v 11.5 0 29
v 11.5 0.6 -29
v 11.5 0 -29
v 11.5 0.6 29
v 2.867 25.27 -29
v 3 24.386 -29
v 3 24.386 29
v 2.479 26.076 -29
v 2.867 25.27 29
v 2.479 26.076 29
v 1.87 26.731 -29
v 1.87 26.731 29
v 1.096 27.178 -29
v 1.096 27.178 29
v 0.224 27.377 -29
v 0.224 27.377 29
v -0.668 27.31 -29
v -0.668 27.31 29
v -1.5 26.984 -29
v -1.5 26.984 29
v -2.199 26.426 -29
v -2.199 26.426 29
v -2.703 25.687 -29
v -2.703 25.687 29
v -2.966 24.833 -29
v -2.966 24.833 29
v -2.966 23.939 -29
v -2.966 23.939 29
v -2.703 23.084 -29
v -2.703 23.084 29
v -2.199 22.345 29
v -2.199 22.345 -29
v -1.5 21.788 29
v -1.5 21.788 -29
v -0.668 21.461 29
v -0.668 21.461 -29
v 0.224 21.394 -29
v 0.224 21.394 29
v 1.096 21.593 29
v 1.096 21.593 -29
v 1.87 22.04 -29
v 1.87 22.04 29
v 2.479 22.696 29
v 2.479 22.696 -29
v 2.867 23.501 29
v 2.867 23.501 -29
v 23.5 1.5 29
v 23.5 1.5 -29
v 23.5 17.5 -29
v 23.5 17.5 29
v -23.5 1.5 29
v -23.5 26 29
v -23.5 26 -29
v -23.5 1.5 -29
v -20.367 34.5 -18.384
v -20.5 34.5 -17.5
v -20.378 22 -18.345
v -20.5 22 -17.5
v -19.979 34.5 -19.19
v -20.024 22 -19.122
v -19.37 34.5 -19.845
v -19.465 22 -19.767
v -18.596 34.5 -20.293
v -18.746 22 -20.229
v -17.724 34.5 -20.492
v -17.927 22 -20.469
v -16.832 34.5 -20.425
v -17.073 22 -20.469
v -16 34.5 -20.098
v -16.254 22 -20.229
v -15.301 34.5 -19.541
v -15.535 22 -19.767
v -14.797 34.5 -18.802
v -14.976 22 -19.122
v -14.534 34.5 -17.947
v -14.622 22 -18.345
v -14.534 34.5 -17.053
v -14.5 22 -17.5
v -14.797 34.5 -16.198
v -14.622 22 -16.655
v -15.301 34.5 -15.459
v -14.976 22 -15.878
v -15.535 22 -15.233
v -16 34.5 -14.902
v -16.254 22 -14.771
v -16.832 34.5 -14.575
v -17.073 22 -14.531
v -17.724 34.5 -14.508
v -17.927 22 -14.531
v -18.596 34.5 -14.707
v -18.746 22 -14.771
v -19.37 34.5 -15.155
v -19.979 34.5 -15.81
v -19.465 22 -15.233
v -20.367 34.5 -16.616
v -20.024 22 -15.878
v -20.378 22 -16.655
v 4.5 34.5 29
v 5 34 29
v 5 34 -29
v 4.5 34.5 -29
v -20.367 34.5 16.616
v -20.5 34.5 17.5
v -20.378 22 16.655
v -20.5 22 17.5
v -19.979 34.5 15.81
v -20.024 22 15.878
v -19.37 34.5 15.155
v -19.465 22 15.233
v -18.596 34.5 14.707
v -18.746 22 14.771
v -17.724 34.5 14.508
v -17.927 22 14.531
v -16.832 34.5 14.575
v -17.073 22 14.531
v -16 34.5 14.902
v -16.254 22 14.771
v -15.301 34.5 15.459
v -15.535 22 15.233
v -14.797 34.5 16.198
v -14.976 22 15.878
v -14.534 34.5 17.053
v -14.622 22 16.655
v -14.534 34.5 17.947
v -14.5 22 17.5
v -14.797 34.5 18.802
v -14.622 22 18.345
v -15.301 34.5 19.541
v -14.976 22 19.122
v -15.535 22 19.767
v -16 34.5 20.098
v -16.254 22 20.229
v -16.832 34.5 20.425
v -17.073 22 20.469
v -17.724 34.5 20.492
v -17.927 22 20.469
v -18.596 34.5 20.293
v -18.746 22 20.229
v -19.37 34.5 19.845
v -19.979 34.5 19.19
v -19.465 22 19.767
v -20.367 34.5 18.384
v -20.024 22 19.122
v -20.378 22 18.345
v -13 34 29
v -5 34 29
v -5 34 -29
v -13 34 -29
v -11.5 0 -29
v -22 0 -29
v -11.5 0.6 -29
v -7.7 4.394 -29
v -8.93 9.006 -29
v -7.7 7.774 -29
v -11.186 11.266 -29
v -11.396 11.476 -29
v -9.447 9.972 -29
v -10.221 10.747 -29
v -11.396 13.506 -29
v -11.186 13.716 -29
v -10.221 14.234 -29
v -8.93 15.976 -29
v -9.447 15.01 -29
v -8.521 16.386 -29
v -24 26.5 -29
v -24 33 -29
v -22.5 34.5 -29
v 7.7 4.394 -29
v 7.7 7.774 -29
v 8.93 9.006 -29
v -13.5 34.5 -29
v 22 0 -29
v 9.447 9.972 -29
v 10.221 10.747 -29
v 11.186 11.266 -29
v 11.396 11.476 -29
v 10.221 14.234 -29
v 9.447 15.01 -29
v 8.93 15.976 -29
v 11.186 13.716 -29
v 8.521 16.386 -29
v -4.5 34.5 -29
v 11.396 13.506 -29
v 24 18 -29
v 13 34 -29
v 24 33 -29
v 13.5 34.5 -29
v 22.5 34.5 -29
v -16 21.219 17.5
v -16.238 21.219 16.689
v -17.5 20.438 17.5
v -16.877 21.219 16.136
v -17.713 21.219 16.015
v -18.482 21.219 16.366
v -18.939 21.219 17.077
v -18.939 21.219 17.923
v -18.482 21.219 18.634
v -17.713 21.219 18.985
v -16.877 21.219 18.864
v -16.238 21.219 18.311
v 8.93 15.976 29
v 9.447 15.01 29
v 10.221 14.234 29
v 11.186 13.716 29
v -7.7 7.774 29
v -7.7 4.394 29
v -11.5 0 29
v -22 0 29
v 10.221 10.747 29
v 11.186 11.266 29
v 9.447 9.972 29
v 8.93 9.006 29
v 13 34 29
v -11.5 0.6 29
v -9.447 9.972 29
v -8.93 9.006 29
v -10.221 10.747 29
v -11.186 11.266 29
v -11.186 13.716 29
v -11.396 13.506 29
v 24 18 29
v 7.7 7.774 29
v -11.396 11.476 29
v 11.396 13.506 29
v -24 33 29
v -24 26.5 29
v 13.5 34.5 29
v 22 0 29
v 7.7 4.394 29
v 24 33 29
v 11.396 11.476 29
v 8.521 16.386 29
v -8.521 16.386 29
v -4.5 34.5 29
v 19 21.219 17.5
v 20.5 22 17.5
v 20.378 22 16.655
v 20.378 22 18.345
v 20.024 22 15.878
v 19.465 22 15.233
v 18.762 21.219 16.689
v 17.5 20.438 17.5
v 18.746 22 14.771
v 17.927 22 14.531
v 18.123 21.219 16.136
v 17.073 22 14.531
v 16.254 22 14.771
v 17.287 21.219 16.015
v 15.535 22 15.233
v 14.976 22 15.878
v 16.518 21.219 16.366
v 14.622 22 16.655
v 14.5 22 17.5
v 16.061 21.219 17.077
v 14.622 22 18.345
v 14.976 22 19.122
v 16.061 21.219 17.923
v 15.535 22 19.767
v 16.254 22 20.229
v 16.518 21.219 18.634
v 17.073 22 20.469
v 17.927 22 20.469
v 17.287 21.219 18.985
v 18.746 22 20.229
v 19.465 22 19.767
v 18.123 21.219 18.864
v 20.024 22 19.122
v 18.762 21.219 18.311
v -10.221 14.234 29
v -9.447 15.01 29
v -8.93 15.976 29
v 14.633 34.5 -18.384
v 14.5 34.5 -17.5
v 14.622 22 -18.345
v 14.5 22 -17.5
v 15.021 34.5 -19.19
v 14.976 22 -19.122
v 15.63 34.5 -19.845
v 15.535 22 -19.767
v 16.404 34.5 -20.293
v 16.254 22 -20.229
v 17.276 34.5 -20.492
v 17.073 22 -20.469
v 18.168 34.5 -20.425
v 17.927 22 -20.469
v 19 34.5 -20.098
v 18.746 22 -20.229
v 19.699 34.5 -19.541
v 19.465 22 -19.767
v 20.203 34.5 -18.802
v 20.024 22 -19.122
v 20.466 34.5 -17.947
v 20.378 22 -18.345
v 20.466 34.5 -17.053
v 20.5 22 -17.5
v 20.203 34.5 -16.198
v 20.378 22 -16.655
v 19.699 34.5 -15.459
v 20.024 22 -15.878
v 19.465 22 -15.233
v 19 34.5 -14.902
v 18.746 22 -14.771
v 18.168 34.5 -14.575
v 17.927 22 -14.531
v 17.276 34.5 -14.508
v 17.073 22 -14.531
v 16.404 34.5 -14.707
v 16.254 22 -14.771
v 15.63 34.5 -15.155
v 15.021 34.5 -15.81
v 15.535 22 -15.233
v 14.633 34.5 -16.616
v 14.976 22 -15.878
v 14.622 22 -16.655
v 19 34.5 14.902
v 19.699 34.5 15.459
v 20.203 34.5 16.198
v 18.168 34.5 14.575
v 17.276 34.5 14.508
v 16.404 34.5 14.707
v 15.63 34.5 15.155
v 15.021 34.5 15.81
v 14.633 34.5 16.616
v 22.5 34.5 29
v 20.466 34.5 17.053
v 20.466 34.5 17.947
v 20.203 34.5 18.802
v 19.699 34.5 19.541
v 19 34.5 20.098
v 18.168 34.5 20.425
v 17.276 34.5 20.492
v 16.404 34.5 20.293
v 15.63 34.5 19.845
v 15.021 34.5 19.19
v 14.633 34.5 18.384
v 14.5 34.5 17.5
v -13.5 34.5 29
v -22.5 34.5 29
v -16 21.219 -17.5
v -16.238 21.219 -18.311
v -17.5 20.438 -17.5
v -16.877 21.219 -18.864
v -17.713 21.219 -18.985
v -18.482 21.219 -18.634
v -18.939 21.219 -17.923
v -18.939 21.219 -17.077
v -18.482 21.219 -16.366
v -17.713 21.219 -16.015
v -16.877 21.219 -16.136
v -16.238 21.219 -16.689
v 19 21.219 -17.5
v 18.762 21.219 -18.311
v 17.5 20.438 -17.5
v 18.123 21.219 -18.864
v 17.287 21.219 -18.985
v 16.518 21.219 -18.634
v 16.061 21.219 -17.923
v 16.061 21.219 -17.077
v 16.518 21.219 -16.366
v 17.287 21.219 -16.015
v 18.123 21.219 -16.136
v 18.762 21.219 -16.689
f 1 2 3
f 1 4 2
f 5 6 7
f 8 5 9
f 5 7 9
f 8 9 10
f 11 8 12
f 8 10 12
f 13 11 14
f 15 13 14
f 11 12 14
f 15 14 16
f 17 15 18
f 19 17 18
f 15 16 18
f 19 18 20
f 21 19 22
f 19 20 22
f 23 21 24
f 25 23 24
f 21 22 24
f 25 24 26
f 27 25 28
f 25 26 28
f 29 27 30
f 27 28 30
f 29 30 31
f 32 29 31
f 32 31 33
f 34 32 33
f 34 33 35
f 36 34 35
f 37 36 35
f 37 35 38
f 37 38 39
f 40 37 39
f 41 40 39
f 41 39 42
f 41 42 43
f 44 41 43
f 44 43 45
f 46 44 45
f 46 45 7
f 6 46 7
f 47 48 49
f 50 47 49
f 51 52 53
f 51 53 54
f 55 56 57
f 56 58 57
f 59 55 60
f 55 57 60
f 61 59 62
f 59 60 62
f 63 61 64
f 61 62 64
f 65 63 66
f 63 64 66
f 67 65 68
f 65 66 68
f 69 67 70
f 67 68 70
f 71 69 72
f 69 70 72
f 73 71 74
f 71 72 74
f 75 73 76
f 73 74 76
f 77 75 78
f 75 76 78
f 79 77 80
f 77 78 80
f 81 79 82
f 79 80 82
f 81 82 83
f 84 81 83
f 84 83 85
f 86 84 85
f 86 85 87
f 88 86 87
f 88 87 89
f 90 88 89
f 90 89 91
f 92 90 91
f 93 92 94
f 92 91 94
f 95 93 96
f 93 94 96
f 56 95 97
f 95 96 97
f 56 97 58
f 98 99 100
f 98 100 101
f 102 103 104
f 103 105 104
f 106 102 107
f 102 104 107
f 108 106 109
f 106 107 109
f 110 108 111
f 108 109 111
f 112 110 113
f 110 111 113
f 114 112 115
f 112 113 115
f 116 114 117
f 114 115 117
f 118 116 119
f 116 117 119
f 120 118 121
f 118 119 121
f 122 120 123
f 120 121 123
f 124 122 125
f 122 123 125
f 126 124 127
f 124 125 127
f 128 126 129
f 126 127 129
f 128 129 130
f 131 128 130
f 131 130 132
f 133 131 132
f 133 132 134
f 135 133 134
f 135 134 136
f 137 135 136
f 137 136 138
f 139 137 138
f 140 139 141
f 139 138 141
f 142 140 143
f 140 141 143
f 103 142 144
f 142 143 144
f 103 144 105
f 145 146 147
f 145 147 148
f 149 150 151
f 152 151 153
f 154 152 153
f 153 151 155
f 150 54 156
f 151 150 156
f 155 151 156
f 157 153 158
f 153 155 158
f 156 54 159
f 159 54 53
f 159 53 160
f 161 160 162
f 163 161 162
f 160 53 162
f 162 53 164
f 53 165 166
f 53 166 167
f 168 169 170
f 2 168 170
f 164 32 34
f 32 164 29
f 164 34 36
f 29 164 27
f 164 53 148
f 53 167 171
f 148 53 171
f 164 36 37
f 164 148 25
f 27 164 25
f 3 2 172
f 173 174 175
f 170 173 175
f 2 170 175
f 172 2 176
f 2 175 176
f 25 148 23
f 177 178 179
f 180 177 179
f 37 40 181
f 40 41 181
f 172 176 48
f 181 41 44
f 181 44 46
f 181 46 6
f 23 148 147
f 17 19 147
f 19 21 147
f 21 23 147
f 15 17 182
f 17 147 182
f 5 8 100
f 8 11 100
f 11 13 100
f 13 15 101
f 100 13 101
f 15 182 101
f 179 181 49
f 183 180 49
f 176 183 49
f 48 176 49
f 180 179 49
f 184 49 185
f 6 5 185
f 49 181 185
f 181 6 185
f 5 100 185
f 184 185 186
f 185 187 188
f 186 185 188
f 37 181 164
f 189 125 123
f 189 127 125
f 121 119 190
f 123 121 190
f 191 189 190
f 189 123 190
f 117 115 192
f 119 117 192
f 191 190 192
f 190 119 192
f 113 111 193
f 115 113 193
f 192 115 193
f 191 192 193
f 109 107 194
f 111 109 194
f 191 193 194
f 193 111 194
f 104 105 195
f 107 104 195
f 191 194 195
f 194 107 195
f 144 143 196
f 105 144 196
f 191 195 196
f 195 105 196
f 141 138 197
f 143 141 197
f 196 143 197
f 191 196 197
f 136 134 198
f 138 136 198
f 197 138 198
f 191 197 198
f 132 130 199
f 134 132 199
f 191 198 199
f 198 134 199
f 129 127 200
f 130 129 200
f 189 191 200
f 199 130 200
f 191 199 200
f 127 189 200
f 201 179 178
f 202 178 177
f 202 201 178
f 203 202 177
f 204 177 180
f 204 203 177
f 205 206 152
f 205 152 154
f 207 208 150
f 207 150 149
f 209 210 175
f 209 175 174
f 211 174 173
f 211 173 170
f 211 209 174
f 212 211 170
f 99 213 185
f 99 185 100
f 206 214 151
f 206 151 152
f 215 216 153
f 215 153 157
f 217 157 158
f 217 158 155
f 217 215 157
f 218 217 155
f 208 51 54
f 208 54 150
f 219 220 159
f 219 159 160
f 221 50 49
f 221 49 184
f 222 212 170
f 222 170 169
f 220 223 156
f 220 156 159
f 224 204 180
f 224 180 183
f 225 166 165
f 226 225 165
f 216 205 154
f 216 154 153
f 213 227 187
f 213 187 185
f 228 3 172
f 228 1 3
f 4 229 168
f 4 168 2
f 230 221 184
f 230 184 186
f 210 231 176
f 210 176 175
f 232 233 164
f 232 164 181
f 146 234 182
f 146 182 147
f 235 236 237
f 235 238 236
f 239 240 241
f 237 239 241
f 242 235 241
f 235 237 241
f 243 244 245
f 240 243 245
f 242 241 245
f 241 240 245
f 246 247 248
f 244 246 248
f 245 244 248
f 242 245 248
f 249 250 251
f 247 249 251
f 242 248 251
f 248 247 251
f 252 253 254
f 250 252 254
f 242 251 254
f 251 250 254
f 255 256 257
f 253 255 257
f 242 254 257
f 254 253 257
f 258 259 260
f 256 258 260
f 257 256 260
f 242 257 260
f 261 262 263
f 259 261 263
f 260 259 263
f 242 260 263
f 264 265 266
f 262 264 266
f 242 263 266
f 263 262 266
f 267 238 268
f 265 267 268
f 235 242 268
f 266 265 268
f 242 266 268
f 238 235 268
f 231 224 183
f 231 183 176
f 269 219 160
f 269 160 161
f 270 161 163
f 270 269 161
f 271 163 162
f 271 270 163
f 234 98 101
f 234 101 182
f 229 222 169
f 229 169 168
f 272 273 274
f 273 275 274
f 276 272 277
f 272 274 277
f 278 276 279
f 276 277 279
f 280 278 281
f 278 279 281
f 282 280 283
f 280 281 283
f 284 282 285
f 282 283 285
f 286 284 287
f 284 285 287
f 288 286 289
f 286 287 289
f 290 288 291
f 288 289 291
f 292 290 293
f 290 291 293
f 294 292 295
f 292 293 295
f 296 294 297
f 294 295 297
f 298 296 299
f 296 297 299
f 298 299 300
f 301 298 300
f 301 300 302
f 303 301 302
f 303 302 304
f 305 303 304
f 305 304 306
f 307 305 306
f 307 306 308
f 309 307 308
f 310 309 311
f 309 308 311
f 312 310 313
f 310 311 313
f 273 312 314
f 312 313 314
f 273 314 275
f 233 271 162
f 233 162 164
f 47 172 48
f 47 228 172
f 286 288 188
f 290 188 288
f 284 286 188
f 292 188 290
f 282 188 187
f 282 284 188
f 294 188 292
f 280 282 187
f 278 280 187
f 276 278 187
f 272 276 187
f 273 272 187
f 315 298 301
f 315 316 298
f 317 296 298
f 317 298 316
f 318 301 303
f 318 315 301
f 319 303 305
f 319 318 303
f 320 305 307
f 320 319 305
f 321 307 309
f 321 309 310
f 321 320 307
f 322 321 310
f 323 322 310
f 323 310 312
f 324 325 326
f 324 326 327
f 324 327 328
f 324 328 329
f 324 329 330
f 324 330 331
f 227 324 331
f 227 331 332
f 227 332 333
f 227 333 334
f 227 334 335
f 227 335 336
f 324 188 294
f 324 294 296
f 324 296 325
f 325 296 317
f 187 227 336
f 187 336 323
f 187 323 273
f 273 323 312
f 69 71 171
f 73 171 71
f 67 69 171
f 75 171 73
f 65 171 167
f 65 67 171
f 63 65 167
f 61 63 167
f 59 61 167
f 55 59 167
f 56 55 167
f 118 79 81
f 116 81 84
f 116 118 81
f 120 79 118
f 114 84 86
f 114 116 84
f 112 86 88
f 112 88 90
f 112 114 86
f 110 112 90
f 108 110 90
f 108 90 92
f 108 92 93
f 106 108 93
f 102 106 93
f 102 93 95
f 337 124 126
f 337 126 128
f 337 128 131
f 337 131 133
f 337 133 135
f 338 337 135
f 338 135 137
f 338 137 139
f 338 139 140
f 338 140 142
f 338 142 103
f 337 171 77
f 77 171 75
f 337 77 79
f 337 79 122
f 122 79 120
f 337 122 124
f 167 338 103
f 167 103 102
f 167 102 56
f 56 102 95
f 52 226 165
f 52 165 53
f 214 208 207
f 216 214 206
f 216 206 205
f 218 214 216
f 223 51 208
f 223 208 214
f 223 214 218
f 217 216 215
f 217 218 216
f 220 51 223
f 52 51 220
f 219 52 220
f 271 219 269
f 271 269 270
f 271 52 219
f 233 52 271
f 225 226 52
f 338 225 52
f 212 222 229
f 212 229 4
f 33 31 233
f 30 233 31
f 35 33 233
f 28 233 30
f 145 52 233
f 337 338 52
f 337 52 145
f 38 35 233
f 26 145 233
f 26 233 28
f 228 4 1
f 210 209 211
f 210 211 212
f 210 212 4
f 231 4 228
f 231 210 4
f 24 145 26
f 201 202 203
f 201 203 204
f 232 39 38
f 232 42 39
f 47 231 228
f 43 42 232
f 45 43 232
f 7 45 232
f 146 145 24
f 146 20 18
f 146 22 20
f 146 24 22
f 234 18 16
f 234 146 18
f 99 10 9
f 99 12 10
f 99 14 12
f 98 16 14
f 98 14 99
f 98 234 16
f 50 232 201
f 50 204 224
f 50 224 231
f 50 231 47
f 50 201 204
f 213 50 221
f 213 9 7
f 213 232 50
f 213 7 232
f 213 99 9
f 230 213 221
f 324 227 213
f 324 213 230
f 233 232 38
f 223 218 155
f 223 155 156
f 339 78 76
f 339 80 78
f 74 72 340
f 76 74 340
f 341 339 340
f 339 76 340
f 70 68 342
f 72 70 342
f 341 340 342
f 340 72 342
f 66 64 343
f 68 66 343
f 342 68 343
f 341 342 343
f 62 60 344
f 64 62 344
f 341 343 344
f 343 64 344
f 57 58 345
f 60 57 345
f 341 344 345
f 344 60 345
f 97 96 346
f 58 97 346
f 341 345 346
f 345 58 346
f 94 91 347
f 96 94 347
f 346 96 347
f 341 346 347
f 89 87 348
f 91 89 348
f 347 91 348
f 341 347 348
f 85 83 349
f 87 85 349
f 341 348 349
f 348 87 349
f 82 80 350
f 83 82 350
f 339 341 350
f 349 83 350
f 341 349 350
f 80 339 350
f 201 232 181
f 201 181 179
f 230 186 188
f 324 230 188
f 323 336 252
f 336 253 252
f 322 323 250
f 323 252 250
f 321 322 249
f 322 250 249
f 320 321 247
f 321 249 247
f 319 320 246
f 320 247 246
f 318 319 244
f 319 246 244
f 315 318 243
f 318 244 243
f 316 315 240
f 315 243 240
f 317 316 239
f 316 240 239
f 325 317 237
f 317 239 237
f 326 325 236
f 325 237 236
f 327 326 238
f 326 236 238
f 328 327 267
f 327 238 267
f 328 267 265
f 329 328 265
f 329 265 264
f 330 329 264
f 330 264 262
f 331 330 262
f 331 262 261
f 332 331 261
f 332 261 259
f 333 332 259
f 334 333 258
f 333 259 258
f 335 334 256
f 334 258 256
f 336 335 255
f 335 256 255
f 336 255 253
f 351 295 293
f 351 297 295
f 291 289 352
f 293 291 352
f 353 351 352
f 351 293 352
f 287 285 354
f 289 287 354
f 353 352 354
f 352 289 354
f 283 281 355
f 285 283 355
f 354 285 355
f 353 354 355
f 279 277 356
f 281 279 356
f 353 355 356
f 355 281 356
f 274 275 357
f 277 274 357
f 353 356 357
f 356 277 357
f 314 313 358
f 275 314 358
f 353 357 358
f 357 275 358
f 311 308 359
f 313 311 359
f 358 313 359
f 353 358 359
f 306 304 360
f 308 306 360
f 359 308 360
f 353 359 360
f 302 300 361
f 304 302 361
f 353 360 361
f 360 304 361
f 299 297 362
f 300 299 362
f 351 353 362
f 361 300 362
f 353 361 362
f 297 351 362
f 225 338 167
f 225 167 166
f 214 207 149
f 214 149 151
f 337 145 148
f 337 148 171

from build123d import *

# Parameters (mm, degrees)
BLOCK_DEPTH                     = 29
TAP_DRILL_FOR_M8X1_0_TAP1_D     = 6
TAP_DRILL_FOR_M8X1_0_TAP1_DEPTH = 12.5
TAP_DRILL_FOR_M8X1_0_TAP1_TIP   = 1.561701152
F_6_0_6_DIAMETER_HOLE1_D        = 6


with BuildPart() as part:
    # Sketch2 → Block (new body, symmetric)
    with BuildSketch(Plane.XY):
        with BuildLine():
            Line((22, 0), (23.5, 1.5))
            Line((23.5, 1.5), (23.5, 17.499972901))
            Line((23.5, 17.499972901), (24, 17.999972901))
            Line((24, 17.999972901), (24, 32.999972901))
            Line((24, 32.999972901), (22.5, 34.5))
            Line((22.5, 34.5), (13.5, 34.5))
            Line((13.5, 34.5), (13.000005928, 34))
            Line((13.000005928, 34), (5.000005928, 34))
            Line((5.000005928, 34), (4.500011856, 34.5))
            Line((4.500011856, 34.5), (-4.499988144, 34.5))
            Line((-4.499988144, 34.5), (-4.999982216, 34))
            Line((-4.999982216, 34), (-12.999982216, 34))
            Line((-12.999982216, 34), (-13.499976288, 34.5))
            Line((-13.499976288, 34.5), (-22.499976288, 34.5))
            Line((-22.499976288, 34.5), (-24, 32.999996612))
            Line((-24, 32.999996612), (-24, 26.499996612))
            Line((-24, 26.499996612), (-23.5, 25.999996612))
            Line((-23.5, 25.999996612), (-23.5, 1.5))
            Line((-23.5, 1.5), (-22, 0))
            Line((-22, 0), (-11.5, 0))
            Line((-11.5, 0), (-11.5, 0.6))
            Line((-11.5, 0.6), (-7.7, 4.393650985))
            Line((-7.7, 4.393650985), (-7.7, 7.773650985))
            Line((-7.7, 7.773650985), (-8.93, 9.0057095))
            ThreePointArc((-8.93, 9.0057095), (-9.805517545, 10.387881926), (-11.186224007, 11.2657095))
            Line((-11.186224007, 11.2657095), (-11.39587314, 11.4757095))
            Line((-11.39587314, 11.4757095), (-11.39587314, 13.5057095))
            Line((-11.39587314, 13.5057095), (-11.186224007, 13.7157095))
            ThreePointArc((-11.186224007, 13.7157095), (-9.805517545, 14.593537075), (-8.93, 15.9757095))
            Line((-8.93, 15.9757095), (-8.520685025, 16.3857095))
            Line((-8.520685025, 16.3857095), (8.520685025, 16.3857095))
            Line((8.520685025, 16.3857095), (8.93, 15.9757095))
            ThreePointArc((8.93, 15.9757095), (9.805517545, 14.593537075), (11.186224007, 13.7157095))
            Line((11.186224007, 13.7157095), (11.39587314, 13.5057095))
            Line((11.39587314, 13.5057095), (11.39587314, 11.4757095))
            Line((11.39587314, 11.4757095), (11.186224007, 11.2657095))
            ThreePointArc((11.186224007, 11.2657095), (9.805517545, 10.387881926), (8.93, 9.0057095))
            Line((8.93, 9.0057095), (7.7, 7.773650985))
            Line((7.7, 7.773650985), (7.7, 4.393650985))
            Line((7.7, 4.393650985), (11.5, 0.6))
            Line((11.5, 0.6), (11.5, 0))
            Line((11.5, 0), (22, 0))
        make_face()
    extrude(amount=BLOCK_DEPTH, both=True)

    # Tap Drill for M8x1.0 Tap1
    with Locations(Plane(origin=(0, 34.5, 0), x_dir=(1, 0, 0), z_dir=(0, 1, 0))):
        with Locations((17.5, 17.5), (-17.5, 17.5), (17.5, -17.5), (-17.5, -17.5)):
            Hole(TAP_DRILL_FOR_M8X1_0_TAP1_D / 2, depth=TAP_DRILL_FOR_M8X1_0_TAP1_DEPTH)
            with Locations((0, 0, -(TAP_DRILL_FOR_M8X1_0_TAP1_DEPTH + TAP_DRILL_FOR_M8X1_0_TAP1_TIP / 2))):  # 125° drill point
                Cone(0, TAP_DRILL_FOR_M8X1_0_TAP1_D / 2, TAP_DRILL_FOR_M8X1_0_TAP1_TIP, mode=Mode.SUBTRACT)

    # Ø6.0 (6) Diameter Hole1 (through all)
    with Locations(Plane(origin=(0, 0, -29), x_dir=(-1, 0, 0), z_dir=(0, 0, -1))):
        with Locations((0, 24.3857095)):
            Hole(F_6_0_6_DIAMETER_HOLE1_D / 2)


solid = part.part
